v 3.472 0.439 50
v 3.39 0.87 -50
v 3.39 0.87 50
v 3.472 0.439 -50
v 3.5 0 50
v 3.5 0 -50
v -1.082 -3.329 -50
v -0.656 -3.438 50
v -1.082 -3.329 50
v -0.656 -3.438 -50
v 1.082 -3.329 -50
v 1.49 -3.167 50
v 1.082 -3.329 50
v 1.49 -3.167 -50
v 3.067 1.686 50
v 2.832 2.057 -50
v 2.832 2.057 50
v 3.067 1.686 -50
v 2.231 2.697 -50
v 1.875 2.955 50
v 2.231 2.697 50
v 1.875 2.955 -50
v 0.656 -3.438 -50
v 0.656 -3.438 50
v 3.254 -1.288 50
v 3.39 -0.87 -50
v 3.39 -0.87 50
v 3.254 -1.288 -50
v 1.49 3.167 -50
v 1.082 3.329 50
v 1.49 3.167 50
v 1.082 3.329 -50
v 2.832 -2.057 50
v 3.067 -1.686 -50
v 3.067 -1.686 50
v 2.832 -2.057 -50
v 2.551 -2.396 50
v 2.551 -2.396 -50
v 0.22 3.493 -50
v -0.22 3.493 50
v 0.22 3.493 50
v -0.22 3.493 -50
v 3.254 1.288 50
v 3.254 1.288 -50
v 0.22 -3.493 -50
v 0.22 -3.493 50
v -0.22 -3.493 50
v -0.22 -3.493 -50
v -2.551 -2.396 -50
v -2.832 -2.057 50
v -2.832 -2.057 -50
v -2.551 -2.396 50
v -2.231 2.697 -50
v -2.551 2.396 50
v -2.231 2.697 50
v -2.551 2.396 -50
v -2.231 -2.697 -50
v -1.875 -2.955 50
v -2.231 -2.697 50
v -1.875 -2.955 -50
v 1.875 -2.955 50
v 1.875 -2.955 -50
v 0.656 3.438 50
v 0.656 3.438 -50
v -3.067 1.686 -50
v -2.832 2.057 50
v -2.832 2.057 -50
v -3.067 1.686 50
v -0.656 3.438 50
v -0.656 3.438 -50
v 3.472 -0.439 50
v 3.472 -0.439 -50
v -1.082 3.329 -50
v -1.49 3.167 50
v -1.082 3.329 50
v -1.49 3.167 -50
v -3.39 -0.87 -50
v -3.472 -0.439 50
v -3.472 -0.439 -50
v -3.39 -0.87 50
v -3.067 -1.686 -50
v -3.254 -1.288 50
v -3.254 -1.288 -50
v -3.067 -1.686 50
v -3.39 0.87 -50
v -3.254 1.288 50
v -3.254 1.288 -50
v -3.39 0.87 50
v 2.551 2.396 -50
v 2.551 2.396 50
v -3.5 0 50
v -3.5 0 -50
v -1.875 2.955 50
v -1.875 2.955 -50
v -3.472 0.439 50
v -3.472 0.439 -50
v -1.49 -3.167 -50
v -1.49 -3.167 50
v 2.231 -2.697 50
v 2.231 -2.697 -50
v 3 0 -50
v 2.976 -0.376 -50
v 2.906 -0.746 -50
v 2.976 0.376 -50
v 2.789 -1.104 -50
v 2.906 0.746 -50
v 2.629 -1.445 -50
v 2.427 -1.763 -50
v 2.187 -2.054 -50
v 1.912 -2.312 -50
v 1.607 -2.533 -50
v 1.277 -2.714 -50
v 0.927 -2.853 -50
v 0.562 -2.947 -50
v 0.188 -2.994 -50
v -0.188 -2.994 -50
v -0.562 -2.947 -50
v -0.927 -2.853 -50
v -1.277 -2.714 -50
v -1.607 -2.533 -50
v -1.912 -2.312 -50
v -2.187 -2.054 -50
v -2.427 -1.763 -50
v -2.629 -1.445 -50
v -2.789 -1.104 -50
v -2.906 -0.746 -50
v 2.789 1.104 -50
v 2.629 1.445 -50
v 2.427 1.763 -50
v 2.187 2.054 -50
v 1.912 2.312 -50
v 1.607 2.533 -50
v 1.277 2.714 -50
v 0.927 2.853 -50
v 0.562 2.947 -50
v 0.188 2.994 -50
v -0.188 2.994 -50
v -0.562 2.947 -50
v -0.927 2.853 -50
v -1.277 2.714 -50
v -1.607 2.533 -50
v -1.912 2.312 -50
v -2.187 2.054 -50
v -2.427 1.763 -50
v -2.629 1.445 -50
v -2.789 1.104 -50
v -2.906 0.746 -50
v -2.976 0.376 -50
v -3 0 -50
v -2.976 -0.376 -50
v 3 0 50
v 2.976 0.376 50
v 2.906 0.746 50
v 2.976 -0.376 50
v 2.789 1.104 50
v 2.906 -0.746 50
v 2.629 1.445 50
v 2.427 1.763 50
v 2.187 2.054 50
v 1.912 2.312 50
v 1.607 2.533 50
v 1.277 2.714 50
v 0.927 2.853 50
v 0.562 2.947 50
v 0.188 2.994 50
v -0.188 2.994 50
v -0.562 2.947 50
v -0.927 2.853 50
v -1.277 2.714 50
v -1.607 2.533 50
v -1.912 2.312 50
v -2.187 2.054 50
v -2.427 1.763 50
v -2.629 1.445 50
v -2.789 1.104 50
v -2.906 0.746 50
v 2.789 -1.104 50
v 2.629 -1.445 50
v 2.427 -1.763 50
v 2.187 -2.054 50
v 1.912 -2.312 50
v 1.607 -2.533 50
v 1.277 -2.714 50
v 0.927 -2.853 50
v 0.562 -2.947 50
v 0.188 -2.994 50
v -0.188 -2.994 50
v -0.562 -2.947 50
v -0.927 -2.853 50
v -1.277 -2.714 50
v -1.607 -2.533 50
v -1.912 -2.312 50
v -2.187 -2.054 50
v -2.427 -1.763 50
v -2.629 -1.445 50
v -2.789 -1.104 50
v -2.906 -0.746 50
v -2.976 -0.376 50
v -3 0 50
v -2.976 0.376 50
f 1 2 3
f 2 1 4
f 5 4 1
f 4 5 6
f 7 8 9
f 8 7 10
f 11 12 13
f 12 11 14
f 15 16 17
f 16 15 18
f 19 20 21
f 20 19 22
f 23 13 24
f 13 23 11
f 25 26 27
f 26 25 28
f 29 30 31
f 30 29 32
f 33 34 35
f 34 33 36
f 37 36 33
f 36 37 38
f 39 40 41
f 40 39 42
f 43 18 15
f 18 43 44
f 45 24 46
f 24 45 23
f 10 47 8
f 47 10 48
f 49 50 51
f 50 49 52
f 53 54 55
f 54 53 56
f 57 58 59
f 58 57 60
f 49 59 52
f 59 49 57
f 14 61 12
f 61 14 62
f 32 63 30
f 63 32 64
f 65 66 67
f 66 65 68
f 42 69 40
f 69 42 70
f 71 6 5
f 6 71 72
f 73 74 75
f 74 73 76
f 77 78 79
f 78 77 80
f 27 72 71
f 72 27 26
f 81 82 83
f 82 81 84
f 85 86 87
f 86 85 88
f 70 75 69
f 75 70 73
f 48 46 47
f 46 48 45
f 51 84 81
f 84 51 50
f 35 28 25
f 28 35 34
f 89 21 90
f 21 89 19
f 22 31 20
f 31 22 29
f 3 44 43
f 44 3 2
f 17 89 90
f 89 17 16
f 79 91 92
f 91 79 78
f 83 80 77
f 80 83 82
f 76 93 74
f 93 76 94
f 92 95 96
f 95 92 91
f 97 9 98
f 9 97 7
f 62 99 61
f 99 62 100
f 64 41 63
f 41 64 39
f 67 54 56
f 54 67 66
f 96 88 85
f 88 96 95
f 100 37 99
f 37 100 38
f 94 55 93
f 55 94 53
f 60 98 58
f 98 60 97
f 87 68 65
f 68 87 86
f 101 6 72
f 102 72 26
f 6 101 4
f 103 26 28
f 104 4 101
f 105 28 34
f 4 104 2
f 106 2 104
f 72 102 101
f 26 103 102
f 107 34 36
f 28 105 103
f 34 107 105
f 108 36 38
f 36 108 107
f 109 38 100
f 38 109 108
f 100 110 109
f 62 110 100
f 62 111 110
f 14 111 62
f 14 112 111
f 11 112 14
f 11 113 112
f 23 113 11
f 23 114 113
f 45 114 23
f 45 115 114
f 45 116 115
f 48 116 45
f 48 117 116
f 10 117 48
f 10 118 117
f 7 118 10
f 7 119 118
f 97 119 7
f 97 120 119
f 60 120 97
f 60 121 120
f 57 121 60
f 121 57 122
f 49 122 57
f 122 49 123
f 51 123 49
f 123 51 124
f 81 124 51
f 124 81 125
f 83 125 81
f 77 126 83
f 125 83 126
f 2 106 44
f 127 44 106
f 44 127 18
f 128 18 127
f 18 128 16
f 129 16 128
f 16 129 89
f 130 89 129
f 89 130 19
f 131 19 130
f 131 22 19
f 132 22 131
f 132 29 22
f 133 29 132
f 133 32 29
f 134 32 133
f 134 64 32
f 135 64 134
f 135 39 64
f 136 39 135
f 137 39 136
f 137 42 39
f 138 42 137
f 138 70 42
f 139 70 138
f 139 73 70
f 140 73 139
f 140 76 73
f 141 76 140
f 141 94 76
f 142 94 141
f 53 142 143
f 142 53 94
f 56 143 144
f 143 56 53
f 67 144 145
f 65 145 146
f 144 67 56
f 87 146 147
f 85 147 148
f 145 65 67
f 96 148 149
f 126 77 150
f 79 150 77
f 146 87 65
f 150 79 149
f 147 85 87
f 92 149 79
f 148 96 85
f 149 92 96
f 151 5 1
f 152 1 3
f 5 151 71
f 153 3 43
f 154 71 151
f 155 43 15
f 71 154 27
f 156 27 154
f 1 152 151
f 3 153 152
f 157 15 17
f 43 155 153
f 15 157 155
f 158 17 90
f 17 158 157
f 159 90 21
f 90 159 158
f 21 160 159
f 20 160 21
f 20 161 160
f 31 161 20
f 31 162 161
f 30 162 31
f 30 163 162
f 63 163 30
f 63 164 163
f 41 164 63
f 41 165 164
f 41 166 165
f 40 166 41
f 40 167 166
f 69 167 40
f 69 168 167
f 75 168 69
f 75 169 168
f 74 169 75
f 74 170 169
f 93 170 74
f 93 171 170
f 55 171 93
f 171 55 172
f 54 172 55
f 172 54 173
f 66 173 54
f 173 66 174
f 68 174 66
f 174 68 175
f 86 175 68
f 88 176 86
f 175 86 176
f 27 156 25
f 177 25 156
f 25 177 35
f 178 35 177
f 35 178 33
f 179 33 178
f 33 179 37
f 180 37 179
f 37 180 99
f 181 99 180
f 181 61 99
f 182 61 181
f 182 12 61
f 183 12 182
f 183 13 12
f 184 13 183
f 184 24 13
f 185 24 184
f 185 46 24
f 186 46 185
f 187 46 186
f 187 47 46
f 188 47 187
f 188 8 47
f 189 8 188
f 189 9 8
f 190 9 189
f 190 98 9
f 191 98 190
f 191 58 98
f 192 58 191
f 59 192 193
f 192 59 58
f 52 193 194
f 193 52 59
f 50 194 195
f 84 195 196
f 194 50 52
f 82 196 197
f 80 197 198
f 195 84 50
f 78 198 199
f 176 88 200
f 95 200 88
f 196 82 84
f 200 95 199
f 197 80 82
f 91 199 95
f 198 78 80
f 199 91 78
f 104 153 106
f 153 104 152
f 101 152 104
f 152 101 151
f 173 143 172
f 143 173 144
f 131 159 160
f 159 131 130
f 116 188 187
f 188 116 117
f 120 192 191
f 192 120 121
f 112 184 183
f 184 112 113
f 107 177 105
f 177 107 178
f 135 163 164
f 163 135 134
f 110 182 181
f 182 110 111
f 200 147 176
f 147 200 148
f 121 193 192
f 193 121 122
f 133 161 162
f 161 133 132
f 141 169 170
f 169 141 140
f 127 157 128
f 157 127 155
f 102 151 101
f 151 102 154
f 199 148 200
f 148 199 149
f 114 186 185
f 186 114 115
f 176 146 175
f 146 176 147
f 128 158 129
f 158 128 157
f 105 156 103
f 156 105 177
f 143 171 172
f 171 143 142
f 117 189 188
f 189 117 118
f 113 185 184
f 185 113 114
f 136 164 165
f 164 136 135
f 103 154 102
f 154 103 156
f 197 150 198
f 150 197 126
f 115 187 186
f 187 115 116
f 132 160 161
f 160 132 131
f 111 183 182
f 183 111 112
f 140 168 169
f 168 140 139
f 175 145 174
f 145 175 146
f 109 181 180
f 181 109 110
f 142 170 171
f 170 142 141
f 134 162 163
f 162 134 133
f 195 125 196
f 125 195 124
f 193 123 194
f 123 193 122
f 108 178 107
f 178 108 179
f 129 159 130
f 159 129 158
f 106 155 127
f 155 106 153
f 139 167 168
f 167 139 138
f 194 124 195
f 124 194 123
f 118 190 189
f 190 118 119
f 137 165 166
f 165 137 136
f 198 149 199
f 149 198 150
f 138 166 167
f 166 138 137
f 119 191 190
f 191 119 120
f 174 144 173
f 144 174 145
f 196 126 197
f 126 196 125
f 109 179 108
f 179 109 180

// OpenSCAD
$fn = 50;


difference() {
	union() {
		translate(v = [0, 0, -50.0000000000]) {
			cylinder(h = 100, r = 3.5000000000);
		}
	}
	union() {
		translate(v = [0, 0, -100.0000000000]) {
			cylinder(h = 200, r = 3.0000000000);
		}
	}
}
